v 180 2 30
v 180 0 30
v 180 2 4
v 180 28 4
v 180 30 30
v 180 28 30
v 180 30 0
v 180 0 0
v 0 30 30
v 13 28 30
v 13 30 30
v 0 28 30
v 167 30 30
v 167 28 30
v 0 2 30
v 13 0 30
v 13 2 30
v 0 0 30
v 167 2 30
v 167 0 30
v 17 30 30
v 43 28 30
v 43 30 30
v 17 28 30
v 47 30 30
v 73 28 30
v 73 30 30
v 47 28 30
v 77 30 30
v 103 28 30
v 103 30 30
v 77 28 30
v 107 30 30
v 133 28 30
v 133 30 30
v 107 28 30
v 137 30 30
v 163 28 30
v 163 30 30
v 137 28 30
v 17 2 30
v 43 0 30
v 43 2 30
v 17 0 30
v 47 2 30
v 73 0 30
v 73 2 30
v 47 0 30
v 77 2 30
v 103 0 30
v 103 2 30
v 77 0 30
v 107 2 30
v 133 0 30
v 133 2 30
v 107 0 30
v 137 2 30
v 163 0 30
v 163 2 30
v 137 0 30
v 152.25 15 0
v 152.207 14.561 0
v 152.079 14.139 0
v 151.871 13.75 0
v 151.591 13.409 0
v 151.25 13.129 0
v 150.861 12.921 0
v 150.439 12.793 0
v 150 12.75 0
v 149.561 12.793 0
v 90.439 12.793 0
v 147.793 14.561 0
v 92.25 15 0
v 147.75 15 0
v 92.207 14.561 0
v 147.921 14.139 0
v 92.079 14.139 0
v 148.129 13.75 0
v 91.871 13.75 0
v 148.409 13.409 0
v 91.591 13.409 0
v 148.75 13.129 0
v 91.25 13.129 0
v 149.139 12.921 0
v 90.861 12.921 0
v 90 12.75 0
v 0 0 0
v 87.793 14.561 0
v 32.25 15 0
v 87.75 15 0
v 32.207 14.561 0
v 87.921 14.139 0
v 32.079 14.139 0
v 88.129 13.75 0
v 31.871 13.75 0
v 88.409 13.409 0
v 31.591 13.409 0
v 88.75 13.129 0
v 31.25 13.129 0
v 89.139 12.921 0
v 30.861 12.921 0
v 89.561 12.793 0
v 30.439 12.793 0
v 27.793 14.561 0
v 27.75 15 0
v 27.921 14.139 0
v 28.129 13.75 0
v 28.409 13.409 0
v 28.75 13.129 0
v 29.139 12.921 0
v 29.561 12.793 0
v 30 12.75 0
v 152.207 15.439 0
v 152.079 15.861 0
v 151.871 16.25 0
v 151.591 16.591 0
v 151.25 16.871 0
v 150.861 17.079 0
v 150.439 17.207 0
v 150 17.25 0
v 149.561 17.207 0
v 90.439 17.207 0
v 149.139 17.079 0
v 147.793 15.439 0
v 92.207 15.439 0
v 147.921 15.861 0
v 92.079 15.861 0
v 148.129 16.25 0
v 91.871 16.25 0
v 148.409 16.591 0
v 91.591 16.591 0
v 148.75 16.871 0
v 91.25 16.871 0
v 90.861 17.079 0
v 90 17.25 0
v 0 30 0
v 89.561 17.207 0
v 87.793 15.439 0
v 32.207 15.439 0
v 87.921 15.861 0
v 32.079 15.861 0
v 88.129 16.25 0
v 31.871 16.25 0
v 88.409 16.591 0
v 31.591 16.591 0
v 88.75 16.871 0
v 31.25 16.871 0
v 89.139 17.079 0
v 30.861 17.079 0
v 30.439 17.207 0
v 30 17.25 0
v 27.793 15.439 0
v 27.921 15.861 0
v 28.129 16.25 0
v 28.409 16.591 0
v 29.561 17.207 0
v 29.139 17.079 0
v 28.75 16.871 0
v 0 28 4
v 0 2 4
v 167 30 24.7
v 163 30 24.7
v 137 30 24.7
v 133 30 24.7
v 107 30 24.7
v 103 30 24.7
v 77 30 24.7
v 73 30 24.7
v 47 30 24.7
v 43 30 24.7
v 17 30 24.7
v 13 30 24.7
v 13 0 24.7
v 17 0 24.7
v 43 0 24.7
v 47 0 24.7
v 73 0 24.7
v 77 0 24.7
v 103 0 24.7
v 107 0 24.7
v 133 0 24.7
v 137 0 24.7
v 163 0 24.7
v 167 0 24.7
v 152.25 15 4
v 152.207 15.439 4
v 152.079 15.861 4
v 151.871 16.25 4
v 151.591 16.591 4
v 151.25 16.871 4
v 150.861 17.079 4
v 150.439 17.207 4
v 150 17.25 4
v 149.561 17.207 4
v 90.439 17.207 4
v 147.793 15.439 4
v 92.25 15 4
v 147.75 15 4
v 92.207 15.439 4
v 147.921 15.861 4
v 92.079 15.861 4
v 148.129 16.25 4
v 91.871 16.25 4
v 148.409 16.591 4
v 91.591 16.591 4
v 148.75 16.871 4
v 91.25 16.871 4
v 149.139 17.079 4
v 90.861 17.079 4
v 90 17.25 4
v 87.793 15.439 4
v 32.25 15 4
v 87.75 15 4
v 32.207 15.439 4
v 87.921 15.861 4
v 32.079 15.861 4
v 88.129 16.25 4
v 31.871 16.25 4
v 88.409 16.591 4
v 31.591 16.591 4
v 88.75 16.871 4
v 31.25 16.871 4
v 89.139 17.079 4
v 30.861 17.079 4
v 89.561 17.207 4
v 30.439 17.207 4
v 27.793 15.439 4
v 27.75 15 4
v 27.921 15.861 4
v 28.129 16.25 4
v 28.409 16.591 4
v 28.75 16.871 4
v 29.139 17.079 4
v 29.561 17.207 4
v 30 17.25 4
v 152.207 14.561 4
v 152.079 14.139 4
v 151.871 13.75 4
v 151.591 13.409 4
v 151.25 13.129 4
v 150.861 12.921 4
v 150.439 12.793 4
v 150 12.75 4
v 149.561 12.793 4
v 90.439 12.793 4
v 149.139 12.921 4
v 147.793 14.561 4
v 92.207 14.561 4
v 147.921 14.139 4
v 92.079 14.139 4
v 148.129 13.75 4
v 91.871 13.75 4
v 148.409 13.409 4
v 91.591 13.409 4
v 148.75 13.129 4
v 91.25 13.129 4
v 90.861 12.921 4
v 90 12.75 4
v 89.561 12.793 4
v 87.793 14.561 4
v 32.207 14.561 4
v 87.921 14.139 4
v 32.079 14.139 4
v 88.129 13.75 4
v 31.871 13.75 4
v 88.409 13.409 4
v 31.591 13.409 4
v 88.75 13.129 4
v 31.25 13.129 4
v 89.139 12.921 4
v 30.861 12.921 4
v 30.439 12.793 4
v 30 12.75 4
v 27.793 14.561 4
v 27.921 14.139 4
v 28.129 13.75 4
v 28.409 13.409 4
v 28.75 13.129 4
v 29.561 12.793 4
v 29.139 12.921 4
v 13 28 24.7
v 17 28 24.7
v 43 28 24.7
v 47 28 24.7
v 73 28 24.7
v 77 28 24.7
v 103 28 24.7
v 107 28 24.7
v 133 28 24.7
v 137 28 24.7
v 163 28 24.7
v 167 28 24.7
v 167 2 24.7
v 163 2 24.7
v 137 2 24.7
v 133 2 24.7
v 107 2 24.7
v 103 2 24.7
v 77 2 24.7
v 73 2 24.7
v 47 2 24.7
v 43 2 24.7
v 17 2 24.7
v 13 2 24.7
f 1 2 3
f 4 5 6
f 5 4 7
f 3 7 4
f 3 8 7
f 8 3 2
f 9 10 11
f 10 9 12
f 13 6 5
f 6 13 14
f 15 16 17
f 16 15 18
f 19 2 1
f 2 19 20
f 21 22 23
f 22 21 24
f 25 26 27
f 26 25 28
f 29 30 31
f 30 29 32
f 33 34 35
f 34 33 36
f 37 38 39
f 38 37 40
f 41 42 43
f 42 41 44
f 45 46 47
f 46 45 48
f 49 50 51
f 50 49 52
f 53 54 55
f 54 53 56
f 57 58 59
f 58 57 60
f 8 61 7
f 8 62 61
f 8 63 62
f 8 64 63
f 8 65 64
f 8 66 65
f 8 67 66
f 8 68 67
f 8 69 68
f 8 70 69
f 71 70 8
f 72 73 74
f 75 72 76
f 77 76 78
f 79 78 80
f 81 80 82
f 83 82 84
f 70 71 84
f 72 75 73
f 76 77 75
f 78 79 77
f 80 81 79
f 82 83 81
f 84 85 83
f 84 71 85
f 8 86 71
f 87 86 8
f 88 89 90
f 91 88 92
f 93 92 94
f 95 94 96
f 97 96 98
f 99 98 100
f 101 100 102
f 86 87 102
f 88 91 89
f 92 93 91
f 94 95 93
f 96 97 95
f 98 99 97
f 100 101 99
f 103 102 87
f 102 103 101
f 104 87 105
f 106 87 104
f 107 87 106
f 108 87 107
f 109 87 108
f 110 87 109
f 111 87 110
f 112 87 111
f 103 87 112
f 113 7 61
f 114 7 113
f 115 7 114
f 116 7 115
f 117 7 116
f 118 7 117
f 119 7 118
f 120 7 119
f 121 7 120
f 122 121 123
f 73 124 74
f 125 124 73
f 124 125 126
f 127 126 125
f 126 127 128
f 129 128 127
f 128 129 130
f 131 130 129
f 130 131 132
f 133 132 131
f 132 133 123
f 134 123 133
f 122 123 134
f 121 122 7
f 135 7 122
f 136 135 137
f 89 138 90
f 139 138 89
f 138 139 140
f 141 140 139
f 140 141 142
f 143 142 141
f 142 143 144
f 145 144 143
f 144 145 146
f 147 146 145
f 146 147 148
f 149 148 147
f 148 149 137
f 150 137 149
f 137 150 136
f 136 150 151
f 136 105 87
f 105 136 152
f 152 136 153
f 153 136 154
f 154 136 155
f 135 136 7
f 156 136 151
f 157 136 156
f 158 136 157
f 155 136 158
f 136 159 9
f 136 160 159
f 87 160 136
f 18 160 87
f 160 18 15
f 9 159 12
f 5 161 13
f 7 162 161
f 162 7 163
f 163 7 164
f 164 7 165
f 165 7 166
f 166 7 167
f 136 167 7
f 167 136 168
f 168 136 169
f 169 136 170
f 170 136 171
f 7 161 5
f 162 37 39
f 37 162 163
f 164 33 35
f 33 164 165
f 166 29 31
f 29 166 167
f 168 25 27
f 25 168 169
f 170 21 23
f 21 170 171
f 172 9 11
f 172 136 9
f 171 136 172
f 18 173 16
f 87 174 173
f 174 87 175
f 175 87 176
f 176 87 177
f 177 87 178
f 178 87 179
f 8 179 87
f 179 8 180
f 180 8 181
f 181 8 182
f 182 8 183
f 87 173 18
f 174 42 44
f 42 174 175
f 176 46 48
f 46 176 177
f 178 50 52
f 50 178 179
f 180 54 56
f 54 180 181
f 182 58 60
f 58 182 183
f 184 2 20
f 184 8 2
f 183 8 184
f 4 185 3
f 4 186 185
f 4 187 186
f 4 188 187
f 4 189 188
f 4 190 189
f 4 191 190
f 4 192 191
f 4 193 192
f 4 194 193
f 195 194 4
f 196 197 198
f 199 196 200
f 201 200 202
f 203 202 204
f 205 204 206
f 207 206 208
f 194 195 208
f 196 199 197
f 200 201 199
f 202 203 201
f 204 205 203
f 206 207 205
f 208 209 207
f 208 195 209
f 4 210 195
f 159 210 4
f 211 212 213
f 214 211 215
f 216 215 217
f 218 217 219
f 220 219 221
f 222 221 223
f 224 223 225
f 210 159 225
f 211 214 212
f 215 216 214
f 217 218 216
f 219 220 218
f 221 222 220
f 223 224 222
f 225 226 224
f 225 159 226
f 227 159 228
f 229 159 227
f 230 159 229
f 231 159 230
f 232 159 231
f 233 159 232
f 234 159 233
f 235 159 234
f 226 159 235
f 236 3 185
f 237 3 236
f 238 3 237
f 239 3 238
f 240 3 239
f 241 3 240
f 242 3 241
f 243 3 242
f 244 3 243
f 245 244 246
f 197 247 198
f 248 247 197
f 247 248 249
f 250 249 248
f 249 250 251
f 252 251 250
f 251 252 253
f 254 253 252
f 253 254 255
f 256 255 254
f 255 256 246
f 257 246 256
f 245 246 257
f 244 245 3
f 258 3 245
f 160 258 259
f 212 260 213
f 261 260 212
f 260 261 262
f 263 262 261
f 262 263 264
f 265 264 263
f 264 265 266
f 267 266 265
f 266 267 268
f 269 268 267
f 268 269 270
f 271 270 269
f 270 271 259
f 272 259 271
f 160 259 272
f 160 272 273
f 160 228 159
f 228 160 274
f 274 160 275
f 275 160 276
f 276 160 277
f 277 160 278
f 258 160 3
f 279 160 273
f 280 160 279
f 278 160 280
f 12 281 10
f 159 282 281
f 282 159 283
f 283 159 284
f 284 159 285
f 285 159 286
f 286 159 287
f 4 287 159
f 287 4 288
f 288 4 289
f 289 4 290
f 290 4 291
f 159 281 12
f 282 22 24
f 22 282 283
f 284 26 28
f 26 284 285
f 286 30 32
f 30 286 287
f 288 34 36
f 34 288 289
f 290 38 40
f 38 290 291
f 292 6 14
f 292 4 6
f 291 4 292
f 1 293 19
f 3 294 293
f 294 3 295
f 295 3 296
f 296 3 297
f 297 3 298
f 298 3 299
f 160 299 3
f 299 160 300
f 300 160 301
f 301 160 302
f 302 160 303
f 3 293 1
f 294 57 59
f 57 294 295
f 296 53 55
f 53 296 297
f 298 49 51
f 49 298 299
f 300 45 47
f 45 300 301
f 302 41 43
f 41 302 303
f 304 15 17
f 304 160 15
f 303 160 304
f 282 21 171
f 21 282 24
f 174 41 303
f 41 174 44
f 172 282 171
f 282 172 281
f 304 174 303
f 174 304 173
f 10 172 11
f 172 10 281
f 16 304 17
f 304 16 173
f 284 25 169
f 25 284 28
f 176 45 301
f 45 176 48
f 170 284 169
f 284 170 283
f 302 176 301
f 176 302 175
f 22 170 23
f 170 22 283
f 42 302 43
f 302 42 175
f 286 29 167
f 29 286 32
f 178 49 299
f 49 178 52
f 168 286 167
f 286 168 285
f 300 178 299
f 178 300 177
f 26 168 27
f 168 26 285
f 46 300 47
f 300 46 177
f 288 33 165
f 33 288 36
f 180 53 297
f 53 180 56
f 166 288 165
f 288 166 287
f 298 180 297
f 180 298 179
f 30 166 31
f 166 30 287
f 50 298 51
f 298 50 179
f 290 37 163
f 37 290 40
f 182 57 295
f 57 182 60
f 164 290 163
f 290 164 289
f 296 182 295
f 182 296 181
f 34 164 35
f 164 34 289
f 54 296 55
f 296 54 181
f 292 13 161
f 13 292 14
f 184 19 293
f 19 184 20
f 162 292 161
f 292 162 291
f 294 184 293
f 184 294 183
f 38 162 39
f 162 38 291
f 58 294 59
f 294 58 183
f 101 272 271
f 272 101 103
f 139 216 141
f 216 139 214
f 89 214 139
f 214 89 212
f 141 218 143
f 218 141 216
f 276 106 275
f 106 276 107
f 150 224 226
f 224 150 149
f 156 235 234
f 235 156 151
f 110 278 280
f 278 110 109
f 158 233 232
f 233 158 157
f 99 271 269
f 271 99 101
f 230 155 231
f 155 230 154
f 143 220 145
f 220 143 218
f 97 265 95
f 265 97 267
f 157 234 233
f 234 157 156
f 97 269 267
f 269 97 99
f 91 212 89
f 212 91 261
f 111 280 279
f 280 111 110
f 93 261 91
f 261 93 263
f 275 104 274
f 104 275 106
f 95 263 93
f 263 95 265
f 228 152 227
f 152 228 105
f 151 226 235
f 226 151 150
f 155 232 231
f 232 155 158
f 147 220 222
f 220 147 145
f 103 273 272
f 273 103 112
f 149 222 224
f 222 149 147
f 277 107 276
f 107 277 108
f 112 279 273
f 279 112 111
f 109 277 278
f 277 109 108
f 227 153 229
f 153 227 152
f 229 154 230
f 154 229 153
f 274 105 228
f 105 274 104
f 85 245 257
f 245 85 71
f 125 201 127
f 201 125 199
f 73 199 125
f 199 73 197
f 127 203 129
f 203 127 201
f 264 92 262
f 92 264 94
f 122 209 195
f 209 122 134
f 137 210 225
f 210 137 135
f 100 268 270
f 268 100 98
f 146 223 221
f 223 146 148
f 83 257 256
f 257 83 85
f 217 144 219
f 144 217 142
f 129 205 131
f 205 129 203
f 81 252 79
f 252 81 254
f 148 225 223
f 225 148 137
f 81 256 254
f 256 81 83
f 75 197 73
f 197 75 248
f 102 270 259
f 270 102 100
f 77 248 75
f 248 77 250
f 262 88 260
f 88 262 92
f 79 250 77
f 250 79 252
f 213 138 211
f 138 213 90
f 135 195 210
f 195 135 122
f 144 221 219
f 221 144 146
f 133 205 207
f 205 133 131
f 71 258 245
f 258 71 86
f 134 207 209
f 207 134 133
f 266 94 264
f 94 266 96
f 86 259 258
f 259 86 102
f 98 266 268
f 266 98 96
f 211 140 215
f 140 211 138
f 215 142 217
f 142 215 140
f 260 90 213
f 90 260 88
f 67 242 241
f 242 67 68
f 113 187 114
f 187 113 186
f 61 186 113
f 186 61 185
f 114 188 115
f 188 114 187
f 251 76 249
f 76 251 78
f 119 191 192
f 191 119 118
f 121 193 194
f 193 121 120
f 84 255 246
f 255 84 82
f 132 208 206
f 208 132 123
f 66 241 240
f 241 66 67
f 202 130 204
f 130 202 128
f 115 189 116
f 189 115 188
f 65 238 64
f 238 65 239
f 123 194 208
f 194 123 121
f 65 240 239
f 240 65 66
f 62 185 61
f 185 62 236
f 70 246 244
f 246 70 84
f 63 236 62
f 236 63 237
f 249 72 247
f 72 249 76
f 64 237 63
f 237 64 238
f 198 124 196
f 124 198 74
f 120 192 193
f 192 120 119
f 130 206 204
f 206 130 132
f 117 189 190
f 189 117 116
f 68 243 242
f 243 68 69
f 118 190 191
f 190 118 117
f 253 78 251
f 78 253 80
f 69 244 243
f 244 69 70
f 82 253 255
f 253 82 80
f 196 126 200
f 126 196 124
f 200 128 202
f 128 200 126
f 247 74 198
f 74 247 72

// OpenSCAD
$fn = 32;

// ----------------------------------------------------------------------
// Cable duct: 180 x 30 x 30 mm, 6 fingers
// ----------------------------------------------------------------------

// --- parameters (mm) ---
duct_len = 180;           // duct length, X
duct_w = 30;              // duct width, Y
duct_h = 30;              // duct height, Z
wall_t = 2;               // side wall thickness
floor_t = 4;              // floor thickness
slot_w = 4;               // finger slot width
slot_h = 20.7;            // finger slot height
fingers = 6;              // number of finger slots per side
pitch = 30;               // finger pitch
hole_d = 4.5;             // floor mounting hole
hole_n = 3;               // mounting holes in the floor

module shell() {
  difference() {
    cube([duct_len, duct_w, duct_h]);
    /* open top channel */
    translate([-wall_t - 1, wall_t, floor_t])
      cube([duct_len + 2 * wall_t + 2, duct_w - 2 * wall_t, duct_h + 1]);
  }
}

difference() {
  union() {
    shell();
  }
  /* finger slots cut through both side walls */
  for (i = [0 : fingers - 1]) translate([pitch / 2 + i * pitch - slot_w / 2, -1, floor_t + slot_h]) cube([slot_w, duct_w + 2, duct_h]);
  for (i = [0 : hole_n - 1]) translate([(duct_len / hole_n) * (i + 0.5), duct_w / 2, -1]) cylinder(h = floor_t + 2, d = hole_d);
}
